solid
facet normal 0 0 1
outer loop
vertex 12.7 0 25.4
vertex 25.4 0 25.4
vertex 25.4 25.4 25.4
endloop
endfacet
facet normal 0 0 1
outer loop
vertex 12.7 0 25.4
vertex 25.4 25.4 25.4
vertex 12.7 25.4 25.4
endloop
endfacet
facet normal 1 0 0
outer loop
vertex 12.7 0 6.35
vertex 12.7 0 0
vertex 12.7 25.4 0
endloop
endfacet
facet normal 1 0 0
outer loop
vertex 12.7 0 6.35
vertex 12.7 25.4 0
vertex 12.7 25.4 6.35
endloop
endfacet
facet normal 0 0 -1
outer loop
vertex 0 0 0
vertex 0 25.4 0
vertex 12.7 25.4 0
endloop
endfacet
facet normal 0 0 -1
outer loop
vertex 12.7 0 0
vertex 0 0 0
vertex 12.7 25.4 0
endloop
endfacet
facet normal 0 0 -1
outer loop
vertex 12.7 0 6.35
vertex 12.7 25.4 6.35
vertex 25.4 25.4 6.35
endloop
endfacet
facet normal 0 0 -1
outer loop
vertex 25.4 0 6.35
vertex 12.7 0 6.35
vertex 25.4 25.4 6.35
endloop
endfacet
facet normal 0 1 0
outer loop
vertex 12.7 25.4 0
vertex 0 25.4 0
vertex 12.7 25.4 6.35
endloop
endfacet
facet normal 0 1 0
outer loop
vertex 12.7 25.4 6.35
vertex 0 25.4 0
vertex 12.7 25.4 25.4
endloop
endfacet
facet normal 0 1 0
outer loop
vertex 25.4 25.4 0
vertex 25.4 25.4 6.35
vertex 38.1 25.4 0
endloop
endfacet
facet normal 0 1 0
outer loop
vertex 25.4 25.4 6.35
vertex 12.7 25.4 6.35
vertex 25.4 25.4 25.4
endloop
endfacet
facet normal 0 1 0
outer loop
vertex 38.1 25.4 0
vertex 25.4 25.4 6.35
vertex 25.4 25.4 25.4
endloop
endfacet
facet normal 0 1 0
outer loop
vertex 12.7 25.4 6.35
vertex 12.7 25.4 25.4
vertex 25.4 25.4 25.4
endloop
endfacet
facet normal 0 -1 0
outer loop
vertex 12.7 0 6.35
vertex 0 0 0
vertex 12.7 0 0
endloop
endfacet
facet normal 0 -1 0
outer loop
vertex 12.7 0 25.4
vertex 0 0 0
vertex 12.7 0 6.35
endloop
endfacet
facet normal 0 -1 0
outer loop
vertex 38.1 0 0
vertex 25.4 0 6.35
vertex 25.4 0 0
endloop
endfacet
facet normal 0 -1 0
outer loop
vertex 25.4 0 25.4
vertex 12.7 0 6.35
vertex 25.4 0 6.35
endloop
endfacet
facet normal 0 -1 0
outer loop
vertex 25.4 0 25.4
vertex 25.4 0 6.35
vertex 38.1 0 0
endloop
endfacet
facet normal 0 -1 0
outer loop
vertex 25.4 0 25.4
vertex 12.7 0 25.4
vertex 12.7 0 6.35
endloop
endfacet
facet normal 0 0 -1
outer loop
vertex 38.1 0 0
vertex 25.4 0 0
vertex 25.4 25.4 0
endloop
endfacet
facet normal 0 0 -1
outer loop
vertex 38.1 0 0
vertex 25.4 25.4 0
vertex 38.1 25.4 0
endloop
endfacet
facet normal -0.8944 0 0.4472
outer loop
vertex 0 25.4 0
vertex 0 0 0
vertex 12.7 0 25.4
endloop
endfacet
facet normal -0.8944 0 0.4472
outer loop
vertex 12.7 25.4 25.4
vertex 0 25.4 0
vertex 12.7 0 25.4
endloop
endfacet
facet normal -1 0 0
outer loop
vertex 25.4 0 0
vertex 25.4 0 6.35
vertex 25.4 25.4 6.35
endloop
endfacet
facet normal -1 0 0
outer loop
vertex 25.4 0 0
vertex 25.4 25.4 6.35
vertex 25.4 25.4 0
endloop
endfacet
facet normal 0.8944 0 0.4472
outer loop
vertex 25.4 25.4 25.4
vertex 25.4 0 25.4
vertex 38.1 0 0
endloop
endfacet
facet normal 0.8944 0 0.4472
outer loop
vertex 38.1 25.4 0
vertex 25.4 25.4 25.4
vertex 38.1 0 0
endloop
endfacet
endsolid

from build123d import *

# Parameters (mm, degrees)
F1_DEPTH = 25.4
F3_DEPTH = 25.4


with BuildPart() as f1:
    # F0 (on Front) → F1 (new body)
    with BuildSketch(Plane.XZ):
        Polygon((0, 25.4), (0, 0), (12.7, 0), (12.7, 6.35), (25.4, 6.35), (25.4, 0), (38.1, 0), (38.1, 25.4), align=None)
    extrude(amount=-F1_DEPTH)

    # F2 (on face) → F3 (cut)
    with BuildSketch(Plane.XZ):
        Polygon((0, 25.4), (0, 0), (12.7, 25.4), align=None)
        Polygon((38.1, 25.4), (25.4, 25.4), (38.1, 0), align=None)
    extrude(amount=-F3_DEPTH, mode=Mode.SUBTRACT)


solid = f1.part
